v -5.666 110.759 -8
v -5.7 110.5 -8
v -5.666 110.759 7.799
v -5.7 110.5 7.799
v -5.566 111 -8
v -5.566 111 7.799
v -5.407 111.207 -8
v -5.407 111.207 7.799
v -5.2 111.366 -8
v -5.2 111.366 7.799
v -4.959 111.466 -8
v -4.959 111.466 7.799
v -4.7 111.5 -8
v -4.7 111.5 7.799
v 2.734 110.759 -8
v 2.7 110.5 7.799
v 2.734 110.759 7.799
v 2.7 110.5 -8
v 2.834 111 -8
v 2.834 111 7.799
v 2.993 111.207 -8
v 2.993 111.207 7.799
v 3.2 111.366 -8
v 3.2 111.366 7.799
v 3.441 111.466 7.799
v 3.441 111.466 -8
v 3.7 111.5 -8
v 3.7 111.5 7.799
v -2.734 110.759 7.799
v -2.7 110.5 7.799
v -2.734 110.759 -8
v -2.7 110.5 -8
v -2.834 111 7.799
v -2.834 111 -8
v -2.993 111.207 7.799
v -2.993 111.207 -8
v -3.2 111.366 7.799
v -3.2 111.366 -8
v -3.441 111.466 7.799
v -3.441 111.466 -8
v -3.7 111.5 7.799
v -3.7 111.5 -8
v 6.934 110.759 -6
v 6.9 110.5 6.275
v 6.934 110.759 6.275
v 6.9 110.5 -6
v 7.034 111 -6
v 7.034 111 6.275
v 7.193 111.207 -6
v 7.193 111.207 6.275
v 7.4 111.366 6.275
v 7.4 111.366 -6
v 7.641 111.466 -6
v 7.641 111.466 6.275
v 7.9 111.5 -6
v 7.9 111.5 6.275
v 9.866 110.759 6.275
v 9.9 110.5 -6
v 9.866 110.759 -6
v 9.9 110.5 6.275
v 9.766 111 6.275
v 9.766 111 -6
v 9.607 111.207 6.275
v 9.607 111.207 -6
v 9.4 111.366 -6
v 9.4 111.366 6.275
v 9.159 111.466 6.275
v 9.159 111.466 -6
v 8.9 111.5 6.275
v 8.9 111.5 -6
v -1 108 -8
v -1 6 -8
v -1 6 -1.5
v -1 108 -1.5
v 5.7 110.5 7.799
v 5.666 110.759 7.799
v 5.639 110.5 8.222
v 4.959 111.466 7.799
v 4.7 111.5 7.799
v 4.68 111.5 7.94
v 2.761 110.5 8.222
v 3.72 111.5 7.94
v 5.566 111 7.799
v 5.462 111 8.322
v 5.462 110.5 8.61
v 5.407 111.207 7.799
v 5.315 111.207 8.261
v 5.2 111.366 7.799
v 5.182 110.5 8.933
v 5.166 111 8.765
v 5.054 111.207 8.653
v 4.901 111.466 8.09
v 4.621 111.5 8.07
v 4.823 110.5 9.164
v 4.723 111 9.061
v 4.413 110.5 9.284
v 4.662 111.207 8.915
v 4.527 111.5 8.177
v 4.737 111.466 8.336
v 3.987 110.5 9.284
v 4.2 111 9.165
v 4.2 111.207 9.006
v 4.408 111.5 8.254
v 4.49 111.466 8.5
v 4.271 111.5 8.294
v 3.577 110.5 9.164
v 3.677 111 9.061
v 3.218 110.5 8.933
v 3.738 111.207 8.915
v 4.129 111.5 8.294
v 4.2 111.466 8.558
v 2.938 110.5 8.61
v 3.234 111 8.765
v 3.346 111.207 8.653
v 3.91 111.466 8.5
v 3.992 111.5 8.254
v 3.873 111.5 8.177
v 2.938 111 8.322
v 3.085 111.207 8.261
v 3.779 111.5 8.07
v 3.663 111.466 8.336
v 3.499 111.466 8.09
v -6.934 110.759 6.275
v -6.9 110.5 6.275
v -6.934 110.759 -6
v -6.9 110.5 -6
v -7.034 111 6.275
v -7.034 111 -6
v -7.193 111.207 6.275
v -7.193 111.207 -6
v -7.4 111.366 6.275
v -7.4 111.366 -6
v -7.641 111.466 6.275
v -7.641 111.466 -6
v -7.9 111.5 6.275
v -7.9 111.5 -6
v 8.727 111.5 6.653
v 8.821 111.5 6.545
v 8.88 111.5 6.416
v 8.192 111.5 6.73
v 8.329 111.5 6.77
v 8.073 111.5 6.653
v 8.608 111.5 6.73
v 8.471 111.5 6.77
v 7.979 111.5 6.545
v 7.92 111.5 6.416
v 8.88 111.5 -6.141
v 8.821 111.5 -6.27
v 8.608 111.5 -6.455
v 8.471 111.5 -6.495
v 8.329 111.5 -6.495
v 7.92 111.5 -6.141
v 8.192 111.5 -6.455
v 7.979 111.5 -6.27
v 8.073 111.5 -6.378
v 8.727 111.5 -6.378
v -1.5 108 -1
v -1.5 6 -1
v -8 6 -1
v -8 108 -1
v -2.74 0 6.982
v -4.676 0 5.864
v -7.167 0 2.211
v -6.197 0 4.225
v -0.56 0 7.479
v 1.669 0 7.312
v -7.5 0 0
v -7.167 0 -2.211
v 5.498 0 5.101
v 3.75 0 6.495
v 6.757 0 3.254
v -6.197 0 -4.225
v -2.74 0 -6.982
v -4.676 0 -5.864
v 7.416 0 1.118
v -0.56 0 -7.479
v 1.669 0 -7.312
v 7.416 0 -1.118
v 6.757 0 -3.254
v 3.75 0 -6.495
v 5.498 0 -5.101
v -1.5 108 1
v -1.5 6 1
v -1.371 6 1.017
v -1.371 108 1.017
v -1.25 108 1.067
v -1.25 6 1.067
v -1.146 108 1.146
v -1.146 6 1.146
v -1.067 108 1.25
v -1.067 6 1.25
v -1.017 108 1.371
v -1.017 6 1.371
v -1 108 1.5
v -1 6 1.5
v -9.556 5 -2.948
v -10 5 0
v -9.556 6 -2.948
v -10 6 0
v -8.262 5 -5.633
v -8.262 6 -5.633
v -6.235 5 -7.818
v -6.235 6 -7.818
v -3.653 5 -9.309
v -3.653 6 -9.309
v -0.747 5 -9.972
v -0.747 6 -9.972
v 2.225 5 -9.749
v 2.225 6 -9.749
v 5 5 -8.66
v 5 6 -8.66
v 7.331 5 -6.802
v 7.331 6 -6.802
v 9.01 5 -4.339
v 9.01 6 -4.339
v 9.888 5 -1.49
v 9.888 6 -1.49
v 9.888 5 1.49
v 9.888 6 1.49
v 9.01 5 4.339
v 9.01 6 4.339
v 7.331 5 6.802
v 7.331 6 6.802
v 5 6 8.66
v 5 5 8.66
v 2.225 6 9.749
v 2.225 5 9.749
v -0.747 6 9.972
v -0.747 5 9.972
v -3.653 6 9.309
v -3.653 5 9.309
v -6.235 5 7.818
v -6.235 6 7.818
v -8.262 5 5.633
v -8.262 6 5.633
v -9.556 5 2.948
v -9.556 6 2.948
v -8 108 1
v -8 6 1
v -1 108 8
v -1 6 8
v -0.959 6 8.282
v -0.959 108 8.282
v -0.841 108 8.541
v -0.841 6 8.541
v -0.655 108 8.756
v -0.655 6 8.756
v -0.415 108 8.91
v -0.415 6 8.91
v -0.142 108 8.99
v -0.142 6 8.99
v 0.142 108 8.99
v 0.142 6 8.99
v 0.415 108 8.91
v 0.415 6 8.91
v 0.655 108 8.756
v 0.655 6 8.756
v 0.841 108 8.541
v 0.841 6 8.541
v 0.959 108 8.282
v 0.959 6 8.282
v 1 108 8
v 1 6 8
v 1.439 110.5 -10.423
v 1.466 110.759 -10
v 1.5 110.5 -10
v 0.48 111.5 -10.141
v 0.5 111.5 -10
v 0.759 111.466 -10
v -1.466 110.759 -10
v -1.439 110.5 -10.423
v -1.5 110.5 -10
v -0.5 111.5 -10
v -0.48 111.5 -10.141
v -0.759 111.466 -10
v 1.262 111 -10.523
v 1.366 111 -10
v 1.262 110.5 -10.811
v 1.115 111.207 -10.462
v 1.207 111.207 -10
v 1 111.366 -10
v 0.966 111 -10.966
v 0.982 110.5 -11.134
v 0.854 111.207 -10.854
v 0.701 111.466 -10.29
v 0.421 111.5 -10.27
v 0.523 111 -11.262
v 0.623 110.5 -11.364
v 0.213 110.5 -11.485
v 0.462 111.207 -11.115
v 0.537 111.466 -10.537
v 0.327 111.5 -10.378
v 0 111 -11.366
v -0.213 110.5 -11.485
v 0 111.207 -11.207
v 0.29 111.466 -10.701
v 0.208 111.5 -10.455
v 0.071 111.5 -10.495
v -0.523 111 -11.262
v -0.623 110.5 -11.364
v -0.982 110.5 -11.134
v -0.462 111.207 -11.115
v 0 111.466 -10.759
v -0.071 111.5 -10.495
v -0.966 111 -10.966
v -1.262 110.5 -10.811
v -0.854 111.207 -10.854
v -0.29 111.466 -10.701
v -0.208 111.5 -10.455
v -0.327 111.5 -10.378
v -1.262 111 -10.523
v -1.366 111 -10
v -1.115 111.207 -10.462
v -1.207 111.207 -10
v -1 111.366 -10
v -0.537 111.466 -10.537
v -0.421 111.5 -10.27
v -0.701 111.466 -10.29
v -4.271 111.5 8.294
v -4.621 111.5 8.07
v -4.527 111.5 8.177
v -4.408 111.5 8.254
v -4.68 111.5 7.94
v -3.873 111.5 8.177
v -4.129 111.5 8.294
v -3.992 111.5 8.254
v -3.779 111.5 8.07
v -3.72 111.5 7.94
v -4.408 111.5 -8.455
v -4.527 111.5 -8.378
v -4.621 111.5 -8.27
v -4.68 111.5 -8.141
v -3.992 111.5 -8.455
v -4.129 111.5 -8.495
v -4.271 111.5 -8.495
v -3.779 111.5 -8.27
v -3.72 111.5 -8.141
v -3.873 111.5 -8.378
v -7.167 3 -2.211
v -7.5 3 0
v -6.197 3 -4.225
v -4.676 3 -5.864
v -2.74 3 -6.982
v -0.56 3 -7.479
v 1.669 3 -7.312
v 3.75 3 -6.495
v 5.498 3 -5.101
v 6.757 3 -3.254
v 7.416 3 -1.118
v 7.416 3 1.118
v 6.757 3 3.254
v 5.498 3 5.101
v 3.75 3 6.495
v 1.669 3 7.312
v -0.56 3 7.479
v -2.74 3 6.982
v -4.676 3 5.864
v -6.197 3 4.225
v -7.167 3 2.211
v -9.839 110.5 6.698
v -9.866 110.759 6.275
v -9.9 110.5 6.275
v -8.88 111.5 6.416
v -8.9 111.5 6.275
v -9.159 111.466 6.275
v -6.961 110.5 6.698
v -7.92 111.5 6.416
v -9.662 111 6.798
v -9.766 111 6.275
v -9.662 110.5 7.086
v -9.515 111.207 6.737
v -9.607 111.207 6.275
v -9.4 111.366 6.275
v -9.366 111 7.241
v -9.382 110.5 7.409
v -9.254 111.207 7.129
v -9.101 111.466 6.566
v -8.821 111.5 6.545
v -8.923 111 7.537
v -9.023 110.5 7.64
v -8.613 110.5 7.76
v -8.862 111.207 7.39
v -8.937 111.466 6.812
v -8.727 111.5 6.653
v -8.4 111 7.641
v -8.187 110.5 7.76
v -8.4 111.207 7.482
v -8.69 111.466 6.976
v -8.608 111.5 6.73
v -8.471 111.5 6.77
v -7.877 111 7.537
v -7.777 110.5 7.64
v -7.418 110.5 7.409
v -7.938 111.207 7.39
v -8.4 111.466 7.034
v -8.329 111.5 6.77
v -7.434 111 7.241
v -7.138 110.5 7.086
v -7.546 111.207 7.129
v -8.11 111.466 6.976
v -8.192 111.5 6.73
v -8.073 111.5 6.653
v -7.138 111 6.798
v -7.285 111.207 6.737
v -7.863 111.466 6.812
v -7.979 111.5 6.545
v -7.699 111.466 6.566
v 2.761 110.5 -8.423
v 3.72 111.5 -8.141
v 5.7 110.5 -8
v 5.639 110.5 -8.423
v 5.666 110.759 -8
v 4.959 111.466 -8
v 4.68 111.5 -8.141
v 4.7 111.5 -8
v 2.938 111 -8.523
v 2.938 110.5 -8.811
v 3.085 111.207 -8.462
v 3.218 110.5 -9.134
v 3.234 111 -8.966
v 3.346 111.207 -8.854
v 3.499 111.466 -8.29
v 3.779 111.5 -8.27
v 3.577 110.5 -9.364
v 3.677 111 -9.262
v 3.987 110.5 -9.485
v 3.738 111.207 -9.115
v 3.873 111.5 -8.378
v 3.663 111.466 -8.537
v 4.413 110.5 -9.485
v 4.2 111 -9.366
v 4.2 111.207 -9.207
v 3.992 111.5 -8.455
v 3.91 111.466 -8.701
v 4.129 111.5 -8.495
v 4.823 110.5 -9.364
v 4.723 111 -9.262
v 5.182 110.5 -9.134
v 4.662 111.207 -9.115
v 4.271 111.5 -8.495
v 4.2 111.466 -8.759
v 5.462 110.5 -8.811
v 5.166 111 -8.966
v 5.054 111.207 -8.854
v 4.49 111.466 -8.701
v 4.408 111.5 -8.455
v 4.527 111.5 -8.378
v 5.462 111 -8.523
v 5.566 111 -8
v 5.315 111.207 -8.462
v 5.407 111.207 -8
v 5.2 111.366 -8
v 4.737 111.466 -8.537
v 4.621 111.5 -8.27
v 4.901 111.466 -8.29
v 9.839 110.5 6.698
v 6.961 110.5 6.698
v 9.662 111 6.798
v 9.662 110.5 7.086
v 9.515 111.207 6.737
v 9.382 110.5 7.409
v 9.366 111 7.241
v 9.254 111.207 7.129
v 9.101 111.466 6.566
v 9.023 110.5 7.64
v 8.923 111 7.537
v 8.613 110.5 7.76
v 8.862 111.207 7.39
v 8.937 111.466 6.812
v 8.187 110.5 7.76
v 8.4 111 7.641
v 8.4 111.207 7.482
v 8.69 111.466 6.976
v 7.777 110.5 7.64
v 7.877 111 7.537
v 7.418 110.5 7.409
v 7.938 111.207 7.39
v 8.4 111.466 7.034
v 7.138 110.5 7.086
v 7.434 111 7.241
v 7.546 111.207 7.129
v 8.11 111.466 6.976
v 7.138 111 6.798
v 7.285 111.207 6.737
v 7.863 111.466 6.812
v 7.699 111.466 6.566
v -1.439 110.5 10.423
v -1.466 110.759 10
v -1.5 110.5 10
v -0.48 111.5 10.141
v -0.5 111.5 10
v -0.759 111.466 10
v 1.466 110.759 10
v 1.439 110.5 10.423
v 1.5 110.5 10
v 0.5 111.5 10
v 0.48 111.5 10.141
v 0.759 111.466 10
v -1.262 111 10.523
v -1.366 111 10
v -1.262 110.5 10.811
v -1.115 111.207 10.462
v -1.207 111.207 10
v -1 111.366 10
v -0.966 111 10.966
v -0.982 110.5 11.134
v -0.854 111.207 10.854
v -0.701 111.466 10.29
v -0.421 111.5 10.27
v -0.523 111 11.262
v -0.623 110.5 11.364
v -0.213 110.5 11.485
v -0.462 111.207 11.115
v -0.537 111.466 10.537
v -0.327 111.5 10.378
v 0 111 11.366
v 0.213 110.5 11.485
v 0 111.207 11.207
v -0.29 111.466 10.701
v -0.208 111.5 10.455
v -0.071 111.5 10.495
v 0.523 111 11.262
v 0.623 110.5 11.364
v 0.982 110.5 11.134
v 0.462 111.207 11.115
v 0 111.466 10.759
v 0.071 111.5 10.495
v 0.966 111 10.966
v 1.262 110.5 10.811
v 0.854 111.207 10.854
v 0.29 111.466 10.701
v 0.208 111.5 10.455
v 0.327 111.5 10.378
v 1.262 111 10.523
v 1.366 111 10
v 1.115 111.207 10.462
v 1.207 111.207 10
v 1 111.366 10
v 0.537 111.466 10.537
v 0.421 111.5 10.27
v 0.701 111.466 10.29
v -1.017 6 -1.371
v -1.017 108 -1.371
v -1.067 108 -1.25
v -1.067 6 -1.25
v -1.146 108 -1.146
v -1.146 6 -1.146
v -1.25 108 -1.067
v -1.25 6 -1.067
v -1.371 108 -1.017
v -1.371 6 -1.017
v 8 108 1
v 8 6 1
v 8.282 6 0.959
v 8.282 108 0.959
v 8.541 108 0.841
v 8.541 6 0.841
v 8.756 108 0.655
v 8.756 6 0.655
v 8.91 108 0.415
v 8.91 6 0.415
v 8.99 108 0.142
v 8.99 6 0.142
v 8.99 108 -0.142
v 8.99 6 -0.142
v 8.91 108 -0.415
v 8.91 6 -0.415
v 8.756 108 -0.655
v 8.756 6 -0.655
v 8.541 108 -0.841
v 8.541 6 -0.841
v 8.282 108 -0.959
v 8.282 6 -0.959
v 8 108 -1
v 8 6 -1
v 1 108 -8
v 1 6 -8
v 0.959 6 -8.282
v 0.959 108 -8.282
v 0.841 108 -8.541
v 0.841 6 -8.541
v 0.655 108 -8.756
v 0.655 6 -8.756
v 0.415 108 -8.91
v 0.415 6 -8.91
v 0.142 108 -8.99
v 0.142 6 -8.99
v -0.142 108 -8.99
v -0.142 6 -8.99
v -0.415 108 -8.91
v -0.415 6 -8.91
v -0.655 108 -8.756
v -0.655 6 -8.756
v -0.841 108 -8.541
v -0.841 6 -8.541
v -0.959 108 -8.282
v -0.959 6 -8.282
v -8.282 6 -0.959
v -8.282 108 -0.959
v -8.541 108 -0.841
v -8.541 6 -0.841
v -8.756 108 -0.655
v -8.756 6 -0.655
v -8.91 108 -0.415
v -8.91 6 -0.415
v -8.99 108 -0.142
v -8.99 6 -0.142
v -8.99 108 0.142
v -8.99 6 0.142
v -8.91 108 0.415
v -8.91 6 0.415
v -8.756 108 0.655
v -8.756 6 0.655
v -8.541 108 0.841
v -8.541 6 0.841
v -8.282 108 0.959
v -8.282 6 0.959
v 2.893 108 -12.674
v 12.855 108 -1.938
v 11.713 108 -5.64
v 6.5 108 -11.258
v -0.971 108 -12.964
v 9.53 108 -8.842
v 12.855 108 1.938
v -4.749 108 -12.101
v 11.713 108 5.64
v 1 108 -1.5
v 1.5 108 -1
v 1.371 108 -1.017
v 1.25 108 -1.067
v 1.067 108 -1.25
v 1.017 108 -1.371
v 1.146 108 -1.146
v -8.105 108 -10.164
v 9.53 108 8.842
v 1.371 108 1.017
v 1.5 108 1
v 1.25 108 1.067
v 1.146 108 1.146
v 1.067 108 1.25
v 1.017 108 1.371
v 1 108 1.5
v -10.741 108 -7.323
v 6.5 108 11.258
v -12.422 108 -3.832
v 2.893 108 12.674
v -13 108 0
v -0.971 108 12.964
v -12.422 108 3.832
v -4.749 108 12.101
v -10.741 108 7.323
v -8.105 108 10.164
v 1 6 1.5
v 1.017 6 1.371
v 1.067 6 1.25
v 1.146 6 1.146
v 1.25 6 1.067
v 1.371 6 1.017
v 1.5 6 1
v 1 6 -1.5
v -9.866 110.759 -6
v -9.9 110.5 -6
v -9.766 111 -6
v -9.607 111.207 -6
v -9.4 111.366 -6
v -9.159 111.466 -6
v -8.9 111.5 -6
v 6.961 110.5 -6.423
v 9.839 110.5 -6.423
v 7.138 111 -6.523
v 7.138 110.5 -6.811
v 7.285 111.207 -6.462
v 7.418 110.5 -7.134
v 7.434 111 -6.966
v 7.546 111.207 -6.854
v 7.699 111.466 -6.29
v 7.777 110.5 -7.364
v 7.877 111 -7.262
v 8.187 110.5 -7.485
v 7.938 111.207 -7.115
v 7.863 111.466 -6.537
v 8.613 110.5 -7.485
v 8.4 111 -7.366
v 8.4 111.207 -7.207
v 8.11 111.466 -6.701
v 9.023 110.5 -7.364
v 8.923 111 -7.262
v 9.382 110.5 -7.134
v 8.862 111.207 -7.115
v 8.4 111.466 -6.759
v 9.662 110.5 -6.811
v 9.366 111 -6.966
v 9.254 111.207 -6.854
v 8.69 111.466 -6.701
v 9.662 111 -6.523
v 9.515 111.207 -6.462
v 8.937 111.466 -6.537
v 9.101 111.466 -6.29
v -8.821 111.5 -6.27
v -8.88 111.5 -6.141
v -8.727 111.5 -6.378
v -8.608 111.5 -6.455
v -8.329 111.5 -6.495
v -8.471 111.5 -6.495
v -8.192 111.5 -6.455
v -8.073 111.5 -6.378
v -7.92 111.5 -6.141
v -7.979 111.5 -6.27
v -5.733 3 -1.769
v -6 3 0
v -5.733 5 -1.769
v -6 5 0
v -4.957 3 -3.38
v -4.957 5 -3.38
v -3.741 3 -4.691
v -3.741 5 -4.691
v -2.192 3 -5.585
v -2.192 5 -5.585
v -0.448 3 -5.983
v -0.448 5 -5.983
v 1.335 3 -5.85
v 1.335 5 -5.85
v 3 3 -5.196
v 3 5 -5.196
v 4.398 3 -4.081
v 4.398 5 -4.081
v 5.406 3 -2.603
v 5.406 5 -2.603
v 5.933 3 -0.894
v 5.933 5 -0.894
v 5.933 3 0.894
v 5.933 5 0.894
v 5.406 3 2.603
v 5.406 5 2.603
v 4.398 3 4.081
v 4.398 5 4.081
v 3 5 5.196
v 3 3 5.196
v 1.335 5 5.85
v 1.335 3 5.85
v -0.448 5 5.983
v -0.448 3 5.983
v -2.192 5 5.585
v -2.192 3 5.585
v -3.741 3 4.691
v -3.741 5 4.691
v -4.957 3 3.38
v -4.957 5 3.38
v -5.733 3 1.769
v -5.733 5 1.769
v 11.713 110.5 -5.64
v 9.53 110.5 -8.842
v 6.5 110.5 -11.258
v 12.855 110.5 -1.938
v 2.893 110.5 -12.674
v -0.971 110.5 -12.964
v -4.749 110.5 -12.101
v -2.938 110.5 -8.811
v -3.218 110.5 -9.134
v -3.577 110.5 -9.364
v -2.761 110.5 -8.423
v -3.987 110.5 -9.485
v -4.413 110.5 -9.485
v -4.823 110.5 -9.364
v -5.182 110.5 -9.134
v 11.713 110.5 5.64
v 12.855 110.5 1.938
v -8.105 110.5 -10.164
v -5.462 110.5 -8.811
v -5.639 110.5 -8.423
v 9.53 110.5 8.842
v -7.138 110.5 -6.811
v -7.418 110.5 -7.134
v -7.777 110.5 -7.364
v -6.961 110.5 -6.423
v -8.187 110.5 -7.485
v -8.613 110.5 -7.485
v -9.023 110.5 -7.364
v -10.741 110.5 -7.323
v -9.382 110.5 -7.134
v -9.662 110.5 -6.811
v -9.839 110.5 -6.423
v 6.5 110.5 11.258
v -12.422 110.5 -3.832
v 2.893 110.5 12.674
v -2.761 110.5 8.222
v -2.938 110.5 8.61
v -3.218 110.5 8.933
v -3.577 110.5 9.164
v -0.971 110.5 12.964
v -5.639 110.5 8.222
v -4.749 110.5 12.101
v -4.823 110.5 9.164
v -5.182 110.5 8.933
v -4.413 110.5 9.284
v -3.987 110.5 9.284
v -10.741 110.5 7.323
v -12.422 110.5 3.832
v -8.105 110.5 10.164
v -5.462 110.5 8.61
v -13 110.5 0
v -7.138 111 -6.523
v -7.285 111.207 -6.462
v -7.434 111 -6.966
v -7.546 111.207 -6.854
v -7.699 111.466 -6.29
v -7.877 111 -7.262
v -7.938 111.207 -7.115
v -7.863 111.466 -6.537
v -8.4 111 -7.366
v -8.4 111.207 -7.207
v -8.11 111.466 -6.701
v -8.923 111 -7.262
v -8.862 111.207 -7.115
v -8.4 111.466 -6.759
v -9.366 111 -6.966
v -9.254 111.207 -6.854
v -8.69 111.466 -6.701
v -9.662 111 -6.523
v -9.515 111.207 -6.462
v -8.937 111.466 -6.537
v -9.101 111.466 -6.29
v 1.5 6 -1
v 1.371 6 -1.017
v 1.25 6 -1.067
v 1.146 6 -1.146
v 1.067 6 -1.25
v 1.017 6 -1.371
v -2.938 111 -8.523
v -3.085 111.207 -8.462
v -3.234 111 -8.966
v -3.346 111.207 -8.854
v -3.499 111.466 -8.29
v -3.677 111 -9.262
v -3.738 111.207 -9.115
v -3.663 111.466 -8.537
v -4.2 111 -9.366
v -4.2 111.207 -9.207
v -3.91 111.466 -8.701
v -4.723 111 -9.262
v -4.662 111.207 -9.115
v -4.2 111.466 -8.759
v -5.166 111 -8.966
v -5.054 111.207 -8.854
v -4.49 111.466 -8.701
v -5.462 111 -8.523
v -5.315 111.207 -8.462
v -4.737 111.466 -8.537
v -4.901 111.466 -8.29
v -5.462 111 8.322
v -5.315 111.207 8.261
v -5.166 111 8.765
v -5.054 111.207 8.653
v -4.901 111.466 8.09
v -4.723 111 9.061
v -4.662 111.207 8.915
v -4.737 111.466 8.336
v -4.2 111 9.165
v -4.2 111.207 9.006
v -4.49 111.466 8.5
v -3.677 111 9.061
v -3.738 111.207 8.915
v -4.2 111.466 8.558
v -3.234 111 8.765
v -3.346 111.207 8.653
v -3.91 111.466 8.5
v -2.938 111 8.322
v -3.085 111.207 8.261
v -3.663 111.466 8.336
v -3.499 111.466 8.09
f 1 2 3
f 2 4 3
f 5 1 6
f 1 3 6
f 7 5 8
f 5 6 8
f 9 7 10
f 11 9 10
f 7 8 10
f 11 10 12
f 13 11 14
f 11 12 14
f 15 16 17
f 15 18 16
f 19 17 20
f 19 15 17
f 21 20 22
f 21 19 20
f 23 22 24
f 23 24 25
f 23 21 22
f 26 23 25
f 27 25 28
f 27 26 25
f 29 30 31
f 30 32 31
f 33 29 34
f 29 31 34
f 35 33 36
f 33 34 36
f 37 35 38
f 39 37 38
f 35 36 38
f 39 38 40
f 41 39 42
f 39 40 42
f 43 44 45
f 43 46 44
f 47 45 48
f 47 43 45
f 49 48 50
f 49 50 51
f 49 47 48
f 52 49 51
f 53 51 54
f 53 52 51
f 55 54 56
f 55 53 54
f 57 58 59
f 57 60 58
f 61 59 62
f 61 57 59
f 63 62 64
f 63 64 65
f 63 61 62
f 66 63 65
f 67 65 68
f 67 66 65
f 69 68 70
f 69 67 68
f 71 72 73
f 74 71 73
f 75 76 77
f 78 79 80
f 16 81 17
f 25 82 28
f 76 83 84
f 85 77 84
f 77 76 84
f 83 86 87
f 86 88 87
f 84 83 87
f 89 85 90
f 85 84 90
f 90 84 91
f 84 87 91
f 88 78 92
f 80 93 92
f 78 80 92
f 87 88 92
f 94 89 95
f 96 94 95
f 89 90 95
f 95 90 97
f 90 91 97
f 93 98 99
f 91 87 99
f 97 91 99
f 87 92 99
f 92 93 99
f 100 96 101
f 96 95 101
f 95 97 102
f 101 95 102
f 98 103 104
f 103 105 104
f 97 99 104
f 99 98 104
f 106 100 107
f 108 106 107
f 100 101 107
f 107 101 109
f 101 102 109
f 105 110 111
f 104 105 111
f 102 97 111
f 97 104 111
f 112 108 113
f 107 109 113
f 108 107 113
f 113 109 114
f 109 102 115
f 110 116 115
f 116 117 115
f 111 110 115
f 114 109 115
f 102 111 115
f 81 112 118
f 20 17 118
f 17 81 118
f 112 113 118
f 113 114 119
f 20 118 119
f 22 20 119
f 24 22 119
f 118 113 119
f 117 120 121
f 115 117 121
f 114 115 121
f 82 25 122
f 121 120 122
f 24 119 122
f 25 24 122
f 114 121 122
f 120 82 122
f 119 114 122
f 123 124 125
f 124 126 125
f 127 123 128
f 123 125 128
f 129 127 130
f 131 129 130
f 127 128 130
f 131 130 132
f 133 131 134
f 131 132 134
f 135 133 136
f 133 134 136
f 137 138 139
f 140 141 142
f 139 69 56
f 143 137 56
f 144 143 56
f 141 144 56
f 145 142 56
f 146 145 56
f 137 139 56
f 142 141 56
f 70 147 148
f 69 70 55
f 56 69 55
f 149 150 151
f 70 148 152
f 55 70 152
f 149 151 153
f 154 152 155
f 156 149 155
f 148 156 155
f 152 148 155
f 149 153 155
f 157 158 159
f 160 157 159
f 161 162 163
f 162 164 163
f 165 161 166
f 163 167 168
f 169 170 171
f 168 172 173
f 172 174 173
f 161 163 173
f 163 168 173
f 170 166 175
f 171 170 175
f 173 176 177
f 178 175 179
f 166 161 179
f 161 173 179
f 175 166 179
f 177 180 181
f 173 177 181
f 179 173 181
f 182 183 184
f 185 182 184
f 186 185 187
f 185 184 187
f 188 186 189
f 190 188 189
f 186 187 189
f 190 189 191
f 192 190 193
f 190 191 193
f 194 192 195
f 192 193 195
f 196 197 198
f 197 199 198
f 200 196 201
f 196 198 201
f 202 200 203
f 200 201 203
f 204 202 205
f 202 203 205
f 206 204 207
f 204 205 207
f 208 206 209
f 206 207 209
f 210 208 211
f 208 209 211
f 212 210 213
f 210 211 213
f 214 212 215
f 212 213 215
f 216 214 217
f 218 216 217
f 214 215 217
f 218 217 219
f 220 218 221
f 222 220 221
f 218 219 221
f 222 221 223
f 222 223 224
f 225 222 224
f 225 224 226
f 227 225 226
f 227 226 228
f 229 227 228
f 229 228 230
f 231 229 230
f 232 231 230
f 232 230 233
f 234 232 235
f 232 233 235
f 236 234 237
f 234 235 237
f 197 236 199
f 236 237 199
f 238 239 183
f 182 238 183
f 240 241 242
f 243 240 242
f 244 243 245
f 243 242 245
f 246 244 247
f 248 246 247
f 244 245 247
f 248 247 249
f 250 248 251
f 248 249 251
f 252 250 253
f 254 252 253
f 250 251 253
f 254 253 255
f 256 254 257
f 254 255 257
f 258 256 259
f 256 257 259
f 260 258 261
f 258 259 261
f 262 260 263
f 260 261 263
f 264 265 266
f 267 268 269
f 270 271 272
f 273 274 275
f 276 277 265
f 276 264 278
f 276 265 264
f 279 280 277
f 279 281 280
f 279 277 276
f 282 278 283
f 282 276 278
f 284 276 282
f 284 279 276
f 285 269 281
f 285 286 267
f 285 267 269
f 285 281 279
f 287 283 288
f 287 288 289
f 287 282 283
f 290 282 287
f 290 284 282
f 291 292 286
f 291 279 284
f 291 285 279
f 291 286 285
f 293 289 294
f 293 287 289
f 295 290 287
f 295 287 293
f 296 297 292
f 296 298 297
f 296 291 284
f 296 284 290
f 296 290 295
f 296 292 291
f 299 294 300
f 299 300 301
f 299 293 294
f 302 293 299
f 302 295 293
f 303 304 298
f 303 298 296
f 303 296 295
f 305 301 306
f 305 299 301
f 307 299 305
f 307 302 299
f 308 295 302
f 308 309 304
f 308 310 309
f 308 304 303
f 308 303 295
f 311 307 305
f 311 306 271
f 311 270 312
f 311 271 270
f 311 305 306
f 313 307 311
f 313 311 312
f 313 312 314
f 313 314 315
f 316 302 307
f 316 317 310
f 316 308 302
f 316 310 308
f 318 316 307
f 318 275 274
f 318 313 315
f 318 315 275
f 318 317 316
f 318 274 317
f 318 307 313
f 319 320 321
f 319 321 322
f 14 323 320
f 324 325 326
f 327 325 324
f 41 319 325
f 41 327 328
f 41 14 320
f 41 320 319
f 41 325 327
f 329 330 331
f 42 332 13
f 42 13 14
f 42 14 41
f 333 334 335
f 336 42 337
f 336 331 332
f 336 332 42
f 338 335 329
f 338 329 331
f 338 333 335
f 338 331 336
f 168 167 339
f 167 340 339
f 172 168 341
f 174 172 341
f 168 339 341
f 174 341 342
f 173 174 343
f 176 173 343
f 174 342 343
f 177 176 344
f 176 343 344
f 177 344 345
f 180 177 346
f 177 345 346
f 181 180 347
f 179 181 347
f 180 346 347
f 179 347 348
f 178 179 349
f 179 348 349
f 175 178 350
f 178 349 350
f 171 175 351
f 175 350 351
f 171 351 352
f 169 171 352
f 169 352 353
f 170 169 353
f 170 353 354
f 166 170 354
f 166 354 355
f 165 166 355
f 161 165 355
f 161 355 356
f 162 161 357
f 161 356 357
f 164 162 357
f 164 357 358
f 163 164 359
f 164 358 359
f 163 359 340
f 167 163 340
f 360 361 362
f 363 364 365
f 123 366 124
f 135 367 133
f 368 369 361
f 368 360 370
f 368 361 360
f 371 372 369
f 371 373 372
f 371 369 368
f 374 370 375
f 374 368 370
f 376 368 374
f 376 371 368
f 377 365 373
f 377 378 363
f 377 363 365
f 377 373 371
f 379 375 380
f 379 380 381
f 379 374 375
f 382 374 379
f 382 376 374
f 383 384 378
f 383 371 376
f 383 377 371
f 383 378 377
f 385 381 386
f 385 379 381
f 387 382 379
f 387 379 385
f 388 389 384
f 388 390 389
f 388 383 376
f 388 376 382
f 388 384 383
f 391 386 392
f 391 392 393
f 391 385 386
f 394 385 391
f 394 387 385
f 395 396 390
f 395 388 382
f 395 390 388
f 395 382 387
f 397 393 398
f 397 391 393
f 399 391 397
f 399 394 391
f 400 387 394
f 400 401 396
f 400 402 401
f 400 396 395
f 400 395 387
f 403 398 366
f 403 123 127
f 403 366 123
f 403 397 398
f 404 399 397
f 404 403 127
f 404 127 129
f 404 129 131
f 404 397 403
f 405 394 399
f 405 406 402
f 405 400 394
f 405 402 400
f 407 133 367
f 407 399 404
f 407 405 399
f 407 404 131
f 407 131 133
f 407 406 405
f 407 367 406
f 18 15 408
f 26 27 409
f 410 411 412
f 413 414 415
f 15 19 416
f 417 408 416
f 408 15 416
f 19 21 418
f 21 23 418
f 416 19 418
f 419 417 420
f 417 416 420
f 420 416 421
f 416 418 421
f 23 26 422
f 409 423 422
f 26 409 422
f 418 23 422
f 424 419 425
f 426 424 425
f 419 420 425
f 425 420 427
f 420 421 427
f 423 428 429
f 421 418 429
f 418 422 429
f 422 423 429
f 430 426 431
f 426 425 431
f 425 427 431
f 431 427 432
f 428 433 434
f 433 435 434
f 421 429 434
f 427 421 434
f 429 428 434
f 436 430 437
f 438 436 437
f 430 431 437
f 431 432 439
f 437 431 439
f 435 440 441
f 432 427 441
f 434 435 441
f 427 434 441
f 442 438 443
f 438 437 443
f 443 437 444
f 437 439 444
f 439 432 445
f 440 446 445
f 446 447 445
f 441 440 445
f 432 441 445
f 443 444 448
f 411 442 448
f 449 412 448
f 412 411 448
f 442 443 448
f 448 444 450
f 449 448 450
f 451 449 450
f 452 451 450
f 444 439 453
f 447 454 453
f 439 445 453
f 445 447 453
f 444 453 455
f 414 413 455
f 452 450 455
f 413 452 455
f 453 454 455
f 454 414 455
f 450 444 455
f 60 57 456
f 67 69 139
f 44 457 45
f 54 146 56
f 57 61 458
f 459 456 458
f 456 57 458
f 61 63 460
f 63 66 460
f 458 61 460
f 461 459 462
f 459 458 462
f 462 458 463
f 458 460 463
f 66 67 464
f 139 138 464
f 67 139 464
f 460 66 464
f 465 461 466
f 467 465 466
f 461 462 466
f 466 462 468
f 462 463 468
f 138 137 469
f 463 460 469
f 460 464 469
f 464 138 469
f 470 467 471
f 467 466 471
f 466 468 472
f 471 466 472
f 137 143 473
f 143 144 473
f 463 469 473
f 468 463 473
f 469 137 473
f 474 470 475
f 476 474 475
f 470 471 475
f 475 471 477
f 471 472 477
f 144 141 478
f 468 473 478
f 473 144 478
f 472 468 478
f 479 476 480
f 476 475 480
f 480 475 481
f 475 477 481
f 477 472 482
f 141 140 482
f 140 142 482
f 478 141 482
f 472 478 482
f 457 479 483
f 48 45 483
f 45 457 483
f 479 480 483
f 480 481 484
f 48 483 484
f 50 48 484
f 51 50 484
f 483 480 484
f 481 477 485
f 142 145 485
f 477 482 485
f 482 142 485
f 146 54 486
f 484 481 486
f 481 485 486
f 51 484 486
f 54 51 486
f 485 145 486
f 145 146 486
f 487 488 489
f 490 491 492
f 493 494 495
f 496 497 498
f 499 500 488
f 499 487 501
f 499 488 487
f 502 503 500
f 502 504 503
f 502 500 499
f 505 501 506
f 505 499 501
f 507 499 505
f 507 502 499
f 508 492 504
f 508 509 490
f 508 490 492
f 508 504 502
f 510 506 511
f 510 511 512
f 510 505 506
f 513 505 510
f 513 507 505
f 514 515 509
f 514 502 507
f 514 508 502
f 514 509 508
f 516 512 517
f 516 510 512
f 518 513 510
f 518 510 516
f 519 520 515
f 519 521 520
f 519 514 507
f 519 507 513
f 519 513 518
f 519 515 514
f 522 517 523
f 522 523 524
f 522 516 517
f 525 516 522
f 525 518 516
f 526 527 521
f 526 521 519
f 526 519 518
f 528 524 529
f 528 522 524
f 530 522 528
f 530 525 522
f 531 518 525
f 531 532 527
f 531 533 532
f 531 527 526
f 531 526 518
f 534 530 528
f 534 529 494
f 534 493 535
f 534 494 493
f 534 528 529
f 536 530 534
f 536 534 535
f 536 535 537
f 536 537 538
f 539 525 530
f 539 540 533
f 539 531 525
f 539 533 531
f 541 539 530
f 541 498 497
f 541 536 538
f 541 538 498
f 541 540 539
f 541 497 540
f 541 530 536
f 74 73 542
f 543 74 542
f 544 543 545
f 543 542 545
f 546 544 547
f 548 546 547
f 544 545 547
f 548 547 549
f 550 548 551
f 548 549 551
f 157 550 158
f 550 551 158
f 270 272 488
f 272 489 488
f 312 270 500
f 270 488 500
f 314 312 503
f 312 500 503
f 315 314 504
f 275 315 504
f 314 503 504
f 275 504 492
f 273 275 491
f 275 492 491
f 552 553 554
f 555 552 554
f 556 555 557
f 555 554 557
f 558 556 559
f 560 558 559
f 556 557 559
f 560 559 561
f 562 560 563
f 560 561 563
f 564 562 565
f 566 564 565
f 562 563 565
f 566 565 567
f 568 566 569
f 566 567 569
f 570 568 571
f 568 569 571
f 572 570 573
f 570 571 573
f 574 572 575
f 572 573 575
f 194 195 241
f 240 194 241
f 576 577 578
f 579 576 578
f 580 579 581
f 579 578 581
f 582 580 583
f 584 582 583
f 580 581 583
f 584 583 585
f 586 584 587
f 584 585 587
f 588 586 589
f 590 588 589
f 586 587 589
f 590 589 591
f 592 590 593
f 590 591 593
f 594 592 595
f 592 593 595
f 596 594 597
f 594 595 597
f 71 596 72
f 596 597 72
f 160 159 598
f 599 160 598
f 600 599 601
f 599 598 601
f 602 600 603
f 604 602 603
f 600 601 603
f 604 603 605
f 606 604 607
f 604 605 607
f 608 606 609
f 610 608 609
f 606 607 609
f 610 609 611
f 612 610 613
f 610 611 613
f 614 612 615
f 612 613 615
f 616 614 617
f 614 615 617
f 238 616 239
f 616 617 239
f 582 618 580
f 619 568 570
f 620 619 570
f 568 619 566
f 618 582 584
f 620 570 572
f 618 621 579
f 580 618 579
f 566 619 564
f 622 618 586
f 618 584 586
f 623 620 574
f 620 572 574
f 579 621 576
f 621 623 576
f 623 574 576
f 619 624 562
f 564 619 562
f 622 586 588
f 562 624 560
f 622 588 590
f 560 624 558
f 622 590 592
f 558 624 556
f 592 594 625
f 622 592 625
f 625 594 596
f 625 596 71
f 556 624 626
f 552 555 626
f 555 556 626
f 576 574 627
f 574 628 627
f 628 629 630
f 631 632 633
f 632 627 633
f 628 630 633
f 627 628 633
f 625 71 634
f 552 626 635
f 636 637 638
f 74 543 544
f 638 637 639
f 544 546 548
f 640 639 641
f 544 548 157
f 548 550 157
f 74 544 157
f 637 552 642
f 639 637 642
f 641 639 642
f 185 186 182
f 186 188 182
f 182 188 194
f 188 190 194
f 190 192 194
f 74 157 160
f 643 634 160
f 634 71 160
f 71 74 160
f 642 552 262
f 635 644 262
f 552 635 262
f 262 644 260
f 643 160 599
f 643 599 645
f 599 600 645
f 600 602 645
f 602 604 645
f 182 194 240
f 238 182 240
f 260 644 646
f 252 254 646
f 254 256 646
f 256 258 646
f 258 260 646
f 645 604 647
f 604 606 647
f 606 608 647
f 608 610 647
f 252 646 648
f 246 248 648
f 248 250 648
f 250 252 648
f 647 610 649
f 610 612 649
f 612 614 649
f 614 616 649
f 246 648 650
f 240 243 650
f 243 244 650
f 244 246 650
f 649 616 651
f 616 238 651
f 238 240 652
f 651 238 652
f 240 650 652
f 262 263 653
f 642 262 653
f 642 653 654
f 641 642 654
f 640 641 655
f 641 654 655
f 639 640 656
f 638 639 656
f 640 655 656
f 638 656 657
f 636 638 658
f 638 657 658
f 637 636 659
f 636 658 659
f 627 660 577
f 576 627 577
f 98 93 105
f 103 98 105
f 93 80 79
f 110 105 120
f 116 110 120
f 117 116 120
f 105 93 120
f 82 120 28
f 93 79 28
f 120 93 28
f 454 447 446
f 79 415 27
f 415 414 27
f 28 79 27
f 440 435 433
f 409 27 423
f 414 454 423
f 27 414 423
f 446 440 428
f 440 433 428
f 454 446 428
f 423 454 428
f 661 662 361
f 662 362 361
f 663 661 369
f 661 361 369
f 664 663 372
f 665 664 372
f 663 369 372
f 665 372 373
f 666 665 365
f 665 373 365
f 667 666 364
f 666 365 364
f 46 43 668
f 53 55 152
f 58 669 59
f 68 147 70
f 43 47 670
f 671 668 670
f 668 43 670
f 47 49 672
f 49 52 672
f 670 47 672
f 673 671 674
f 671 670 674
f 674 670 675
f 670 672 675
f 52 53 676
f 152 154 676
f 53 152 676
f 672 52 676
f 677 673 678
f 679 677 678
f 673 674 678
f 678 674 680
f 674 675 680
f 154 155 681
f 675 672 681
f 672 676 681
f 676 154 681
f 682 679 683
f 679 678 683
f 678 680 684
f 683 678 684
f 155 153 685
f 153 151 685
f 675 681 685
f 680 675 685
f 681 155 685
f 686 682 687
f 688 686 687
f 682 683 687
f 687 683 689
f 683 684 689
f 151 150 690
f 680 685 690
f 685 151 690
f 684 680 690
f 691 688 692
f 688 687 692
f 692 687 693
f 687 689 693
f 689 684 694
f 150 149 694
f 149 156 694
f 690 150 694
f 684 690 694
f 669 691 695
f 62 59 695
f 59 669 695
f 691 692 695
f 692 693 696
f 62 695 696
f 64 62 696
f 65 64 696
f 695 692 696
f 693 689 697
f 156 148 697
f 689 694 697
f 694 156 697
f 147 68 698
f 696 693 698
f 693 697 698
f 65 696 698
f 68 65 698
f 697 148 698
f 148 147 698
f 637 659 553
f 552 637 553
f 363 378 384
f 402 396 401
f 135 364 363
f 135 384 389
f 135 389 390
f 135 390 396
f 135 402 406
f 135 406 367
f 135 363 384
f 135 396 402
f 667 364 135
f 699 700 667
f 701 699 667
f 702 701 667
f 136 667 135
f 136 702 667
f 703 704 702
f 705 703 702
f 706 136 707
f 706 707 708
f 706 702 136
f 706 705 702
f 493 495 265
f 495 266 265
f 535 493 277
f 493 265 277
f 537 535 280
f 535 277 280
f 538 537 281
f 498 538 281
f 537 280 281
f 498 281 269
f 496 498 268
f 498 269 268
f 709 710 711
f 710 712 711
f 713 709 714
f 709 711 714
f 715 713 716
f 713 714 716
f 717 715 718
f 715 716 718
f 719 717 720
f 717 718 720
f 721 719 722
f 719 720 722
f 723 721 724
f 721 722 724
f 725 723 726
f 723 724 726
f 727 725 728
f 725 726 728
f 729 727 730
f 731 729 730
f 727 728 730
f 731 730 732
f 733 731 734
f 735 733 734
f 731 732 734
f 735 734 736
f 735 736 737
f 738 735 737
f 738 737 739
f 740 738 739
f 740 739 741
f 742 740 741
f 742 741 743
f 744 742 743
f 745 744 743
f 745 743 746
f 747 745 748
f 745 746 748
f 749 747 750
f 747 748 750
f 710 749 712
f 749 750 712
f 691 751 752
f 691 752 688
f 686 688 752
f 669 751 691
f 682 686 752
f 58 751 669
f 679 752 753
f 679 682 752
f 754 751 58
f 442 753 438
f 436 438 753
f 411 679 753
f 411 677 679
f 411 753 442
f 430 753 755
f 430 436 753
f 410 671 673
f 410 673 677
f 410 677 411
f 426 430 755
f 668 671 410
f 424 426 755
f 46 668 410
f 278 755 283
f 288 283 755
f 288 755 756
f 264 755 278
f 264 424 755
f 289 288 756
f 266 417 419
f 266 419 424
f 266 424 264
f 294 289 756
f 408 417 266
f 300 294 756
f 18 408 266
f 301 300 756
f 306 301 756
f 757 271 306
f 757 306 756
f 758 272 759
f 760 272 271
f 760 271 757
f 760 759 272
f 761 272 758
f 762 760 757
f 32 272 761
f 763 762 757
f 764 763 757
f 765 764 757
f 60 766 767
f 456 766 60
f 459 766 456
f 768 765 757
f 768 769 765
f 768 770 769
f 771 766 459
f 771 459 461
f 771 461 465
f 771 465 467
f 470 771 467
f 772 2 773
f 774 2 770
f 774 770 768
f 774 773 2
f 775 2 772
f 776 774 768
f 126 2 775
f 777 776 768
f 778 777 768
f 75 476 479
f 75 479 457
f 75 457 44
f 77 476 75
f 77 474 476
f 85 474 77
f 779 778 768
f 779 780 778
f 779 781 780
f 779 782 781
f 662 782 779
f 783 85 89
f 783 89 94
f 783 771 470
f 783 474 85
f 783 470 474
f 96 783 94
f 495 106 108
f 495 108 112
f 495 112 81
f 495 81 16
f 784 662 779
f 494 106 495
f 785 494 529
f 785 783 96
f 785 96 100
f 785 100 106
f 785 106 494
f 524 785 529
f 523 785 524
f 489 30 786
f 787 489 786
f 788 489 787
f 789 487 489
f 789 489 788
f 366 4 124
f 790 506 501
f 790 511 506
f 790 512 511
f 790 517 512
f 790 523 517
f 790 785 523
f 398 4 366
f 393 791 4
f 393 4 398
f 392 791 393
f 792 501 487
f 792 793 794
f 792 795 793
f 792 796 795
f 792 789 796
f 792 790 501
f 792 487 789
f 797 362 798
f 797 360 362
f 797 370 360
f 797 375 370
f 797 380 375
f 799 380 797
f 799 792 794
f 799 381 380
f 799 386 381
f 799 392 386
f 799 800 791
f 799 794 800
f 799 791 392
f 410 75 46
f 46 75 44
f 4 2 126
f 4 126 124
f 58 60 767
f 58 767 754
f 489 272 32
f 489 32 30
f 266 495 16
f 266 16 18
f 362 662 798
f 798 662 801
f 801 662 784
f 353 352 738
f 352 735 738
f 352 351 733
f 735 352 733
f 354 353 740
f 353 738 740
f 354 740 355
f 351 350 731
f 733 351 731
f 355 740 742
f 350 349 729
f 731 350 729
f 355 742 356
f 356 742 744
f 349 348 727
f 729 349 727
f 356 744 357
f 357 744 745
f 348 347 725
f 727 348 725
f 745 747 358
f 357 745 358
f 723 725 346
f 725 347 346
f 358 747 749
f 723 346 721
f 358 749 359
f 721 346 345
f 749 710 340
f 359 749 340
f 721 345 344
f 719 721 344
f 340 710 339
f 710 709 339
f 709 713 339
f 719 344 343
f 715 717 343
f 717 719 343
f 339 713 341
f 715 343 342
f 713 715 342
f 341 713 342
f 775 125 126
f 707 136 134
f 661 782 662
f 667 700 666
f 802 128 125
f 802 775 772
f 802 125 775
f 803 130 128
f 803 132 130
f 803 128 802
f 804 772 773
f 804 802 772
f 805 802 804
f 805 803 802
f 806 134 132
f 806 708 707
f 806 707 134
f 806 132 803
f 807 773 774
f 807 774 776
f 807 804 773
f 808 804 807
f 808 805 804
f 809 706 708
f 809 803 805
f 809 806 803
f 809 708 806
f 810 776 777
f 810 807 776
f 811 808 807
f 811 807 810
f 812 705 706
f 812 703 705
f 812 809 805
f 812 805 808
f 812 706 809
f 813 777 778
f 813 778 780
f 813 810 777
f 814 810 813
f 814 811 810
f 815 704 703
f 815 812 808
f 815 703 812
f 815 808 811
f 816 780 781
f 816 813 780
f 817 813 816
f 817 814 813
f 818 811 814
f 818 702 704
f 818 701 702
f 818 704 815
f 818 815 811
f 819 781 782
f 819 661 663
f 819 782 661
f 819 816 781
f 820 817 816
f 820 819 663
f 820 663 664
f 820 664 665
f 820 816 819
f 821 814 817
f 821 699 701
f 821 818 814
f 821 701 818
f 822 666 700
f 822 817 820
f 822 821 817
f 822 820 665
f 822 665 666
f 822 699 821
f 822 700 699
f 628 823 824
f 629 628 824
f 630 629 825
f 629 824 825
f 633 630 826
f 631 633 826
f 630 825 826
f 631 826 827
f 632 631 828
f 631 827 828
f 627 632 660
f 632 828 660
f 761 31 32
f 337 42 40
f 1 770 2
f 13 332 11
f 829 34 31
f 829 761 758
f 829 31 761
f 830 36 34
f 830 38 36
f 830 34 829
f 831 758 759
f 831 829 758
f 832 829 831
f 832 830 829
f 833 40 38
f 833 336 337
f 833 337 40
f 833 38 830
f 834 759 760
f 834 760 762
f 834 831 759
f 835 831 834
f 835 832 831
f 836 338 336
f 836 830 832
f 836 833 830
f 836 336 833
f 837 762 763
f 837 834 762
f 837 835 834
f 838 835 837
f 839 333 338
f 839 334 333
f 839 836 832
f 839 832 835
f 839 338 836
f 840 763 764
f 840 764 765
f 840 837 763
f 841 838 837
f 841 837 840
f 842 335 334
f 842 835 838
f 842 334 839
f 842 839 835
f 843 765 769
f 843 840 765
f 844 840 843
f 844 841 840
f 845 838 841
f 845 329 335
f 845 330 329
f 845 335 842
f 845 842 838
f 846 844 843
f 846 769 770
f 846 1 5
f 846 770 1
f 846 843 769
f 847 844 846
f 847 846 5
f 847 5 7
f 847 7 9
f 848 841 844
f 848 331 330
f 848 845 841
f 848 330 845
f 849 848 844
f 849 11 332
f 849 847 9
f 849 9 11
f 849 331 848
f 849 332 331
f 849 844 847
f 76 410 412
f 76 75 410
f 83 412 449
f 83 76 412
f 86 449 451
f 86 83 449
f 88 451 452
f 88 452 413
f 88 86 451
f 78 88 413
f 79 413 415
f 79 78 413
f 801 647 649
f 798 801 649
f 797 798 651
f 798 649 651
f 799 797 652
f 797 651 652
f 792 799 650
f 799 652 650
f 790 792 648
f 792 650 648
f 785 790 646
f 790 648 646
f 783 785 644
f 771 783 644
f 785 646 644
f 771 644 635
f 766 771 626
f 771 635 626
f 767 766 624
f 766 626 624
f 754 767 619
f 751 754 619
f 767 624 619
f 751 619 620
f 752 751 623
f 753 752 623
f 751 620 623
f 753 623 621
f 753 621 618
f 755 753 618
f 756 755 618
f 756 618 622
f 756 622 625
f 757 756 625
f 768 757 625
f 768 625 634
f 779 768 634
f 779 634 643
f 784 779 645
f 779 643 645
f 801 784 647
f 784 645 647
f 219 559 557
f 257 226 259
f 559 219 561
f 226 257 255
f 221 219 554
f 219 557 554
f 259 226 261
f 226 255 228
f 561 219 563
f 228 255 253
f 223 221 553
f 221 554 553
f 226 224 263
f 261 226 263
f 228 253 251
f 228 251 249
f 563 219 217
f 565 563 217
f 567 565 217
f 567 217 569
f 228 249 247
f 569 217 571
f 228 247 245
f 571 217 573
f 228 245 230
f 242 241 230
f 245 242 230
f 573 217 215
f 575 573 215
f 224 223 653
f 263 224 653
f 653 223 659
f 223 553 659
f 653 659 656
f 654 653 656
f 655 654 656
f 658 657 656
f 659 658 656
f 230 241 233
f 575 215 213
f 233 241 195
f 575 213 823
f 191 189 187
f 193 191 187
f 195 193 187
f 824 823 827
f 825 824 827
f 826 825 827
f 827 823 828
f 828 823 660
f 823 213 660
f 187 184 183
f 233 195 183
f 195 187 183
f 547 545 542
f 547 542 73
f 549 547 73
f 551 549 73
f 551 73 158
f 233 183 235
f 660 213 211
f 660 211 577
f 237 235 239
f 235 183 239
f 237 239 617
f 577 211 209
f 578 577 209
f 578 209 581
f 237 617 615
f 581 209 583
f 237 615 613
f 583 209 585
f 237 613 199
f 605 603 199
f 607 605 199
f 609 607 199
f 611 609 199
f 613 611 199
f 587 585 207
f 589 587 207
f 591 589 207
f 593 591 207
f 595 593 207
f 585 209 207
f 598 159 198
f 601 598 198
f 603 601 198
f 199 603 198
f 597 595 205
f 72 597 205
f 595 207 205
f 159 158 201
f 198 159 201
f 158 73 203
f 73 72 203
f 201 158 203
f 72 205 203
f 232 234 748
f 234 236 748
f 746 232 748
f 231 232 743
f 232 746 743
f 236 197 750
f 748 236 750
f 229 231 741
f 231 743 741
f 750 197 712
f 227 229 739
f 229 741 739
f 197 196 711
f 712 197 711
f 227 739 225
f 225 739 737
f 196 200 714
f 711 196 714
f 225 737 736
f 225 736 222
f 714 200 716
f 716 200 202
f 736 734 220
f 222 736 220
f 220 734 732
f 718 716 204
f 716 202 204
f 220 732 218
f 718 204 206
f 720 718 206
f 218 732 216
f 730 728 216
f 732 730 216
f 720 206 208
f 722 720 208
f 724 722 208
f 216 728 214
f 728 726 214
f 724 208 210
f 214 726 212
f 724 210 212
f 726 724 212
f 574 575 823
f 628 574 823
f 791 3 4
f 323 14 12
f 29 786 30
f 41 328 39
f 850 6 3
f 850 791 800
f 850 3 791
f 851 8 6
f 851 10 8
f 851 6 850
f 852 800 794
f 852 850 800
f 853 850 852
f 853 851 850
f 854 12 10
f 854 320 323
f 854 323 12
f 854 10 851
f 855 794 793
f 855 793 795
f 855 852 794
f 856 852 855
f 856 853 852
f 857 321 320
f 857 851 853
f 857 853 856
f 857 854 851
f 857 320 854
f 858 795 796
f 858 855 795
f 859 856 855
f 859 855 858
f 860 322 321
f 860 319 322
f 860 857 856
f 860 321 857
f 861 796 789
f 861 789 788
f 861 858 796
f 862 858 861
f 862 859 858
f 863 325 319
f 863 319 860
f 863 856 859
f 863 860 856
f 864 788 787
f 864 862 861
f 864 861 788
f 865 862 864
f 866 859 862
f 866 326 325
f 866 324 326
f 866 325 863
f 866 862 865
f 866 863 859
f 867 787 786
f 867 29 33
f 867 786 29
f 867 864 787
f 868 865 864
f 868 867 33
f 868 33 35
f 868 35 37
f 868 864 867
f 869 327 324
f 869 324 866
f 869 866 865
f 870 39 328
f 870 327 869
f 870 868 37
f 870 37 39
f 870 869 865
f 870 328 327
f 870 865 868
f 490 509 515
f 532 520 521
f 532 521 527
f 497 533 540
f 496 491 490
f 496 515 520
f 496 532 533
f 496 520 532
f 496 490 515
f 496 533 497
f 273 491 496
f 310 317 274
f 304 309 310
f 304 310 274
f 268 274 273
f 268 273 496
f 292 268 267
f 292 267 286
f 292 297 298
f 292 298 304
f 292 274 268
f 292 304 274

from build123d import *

# Parameters (mm, degrees)
BOSS_EXTRUDE1_DEPTH = 102
SKETCH5_R           = 13
BOSS_EXTRUDE2_DEPTH = 2.5
BOSS_EXTRUDE3_DEPTH = 1
FILLET1_R           = 1


with BuildPart() as part:
    # Sketch1 → Revolve1 (revolve)
    with BuildSketch(Plane.XY, mode=Mode.PRIVATE) as revolve1_sk:
        Polygon((0, 0), (7.5, 0), (7.5, 3), (6, 3), (6, 5), (10, 5), (10, 6), (0, 6), align=None)
    revolve(revolve1_sk.sketch.rotate(Axis((0, 6, 0), (0, -1, 0)), 180), axis=Axis((0, 6, 0), (0, -1, 0)))

    # Sketch4 → Boss-Extrude1 (add)
    with BuildSketch(Plane(origin=(0, 6, 0), x_dir=(1, 0, 0), z_dir=(0, 1, 0))):
        with BuildLine():
            Line((-1, 8), (-1, 1.5))
            ThreePointArc((-1, 1.5), (-1.146446609, 1.146446609), (-1.5, 1))
            Line((-1.5, 1), (-8, 1))
            ThreePointArc((-8, 1), (-9, 0), (-8, -1))
            Line((-8, -1), (-1.5, -1))
            ThreePointArc((-1.5, -1), (-1.146446609, -1.146446609), (-1, -1.5))
            Line((-1, -1.5), (-1, -8))
            ThreePointArc((-1, -8), (0, -9), (1, -8))
            Line((1, -8), (1, -1.5))
            ThreePointArc((1, -1.5), (1.146446609, -1.146446609), (1.5, -1))
            Line((1.5, -1), (8, -1))
            ThreePointArc((8, -1), (9, 0), (8, 1))
            Line((8, 1), (1.5, 1))
            ThreePointArc((1.5, 1), (1.146446609, 1.146446609), (1, 1.5))
            Line((1, 1.5), (1, 8))
            ThreePointArc((1, 8), (0, 9), (-1, 8))
        make_face()
    extrude(amount=BOSS_EXTRUDE1_DEPTH)

    # Sketch5 → Boss-Extrude2 (add)
    with BuildSketch(Plane(origin=(0, 108, 0), x_dir=(1, 0, 0), z_dir=(0, 1, 0))):
        with Locations(Location((0, 0, 0), (0, 0, 180))):
            Circle(SKETCH5_R)
    extrude(amount=BOSS_EXTRUDE2_DEPTH)

    # Sketch6 → Boss-Extrude3 (add)
    with BuildSketch(Plane(origin=(0, 110.5, 0), x_dir=(1, 0, 0), z_dir=(0, 1, 0))):
        with BuildLine():
            Line((-1.5, 10), (-1.5, -10))
            ThreePointArc((-1.5, -10), (0, -11.5), (1.5, -10))
            Line((1.5, -10), (1.5, 10))
            ThreePointArc((1.5, 10), (0, 11.5), (-1.5, 10))
        make_face()
        with BuildLine():
            Line((-5.7, 8), (-5.7, -7.799265344))
            ThreePointArc((-5.7, -7.799265344), (-4.2, -9.299265344), (-2.7, -7.799265344))
            Line((-2.7, -7.799265344), (-2.7, 8))
            ThreePointArc((-2.7, 8), (-4.2, 9.5), (-5.7, 8))
        make_face()
        with BuildLine():
            Line((-9.9, 6), (-9.9, -6.275084591))
            ThreePointArc((-9.9, -6.275084591), (-8.4, -7.775084591), (-6.9, -6.275084591))
            Line((-6.9, -6.275084591), (-6.9, 6))
            ThreePointArc((-6.9, 6), (-8.4, 7.5), (-9.9, 6))
        make_face()
        with BuildLine():
            Line((9.9, 6), (9.9, -6.275084591))
            ThreePointArc((9.9, -6.275084591), (8.4, -7.775084591), (6.9, -6.275084591))
            Line((6.9, -6.275084591), (6.9, 6))
            ThreePointArc((6.9, 6), (8.4, 7.5), (9.9, 6))
        make_face()
        with BuildLine():
            Line((5.7, 8), (5.7, -7.799265344))
            ThreePointArc((5.7, -7.799265344), (4.2, -9.299265344), (2.7, -7.799265344))
            Line((2.7, -7.799265344), (2.7, 8))
            ThreePointArc((2.7, 8), (4.2, 9.5), (5.7, 8))
        make_face()
    extrude(amount=BOSS_EXTRUDE3_DEPTH)

    # Fillet1
    fillet1_edges = [part.edges().sort_by_distance(p)[0] for p in [
        (9.9, 111.5, 0.137542295),
        (8.4, 111.5, 7.775084591),
        (6.9, 111.5, 0.137542295),
        (8.4, 111.5, -7.5),
        (5.7, 111.5, -0.100367328),
        (4.2, 111.5, 9.299265344),
        (2.7, 111.5, -0.100367328),
        (4.2, 111.5, -9.5),
        (1.5, 111.5, 0),
        (0, 111.5, 11.5),
        (-1.5, 111.5, 0),
        (0, 111.5, -11.5),
        (-2.7, 111.5, -0.100367328),
        (-4.2, 111.5, 9.299265344),
        (-5.7, 111.5, -0.100367328),
        (-4.2, 111.5, -9.5),
        (-6.9, 111.5, 0.137542295),
        (-8.4, 111.5, 7.775084591),
        (-9.9, 111.5, 0.137542295),
        (-8.4, 111.5, -7.5),
    ]]
    fillet(fillet1_edges, radius=FILLET1_R - 0.0001)  # a hair under: the kernel refuses the full size


solid = part.part
